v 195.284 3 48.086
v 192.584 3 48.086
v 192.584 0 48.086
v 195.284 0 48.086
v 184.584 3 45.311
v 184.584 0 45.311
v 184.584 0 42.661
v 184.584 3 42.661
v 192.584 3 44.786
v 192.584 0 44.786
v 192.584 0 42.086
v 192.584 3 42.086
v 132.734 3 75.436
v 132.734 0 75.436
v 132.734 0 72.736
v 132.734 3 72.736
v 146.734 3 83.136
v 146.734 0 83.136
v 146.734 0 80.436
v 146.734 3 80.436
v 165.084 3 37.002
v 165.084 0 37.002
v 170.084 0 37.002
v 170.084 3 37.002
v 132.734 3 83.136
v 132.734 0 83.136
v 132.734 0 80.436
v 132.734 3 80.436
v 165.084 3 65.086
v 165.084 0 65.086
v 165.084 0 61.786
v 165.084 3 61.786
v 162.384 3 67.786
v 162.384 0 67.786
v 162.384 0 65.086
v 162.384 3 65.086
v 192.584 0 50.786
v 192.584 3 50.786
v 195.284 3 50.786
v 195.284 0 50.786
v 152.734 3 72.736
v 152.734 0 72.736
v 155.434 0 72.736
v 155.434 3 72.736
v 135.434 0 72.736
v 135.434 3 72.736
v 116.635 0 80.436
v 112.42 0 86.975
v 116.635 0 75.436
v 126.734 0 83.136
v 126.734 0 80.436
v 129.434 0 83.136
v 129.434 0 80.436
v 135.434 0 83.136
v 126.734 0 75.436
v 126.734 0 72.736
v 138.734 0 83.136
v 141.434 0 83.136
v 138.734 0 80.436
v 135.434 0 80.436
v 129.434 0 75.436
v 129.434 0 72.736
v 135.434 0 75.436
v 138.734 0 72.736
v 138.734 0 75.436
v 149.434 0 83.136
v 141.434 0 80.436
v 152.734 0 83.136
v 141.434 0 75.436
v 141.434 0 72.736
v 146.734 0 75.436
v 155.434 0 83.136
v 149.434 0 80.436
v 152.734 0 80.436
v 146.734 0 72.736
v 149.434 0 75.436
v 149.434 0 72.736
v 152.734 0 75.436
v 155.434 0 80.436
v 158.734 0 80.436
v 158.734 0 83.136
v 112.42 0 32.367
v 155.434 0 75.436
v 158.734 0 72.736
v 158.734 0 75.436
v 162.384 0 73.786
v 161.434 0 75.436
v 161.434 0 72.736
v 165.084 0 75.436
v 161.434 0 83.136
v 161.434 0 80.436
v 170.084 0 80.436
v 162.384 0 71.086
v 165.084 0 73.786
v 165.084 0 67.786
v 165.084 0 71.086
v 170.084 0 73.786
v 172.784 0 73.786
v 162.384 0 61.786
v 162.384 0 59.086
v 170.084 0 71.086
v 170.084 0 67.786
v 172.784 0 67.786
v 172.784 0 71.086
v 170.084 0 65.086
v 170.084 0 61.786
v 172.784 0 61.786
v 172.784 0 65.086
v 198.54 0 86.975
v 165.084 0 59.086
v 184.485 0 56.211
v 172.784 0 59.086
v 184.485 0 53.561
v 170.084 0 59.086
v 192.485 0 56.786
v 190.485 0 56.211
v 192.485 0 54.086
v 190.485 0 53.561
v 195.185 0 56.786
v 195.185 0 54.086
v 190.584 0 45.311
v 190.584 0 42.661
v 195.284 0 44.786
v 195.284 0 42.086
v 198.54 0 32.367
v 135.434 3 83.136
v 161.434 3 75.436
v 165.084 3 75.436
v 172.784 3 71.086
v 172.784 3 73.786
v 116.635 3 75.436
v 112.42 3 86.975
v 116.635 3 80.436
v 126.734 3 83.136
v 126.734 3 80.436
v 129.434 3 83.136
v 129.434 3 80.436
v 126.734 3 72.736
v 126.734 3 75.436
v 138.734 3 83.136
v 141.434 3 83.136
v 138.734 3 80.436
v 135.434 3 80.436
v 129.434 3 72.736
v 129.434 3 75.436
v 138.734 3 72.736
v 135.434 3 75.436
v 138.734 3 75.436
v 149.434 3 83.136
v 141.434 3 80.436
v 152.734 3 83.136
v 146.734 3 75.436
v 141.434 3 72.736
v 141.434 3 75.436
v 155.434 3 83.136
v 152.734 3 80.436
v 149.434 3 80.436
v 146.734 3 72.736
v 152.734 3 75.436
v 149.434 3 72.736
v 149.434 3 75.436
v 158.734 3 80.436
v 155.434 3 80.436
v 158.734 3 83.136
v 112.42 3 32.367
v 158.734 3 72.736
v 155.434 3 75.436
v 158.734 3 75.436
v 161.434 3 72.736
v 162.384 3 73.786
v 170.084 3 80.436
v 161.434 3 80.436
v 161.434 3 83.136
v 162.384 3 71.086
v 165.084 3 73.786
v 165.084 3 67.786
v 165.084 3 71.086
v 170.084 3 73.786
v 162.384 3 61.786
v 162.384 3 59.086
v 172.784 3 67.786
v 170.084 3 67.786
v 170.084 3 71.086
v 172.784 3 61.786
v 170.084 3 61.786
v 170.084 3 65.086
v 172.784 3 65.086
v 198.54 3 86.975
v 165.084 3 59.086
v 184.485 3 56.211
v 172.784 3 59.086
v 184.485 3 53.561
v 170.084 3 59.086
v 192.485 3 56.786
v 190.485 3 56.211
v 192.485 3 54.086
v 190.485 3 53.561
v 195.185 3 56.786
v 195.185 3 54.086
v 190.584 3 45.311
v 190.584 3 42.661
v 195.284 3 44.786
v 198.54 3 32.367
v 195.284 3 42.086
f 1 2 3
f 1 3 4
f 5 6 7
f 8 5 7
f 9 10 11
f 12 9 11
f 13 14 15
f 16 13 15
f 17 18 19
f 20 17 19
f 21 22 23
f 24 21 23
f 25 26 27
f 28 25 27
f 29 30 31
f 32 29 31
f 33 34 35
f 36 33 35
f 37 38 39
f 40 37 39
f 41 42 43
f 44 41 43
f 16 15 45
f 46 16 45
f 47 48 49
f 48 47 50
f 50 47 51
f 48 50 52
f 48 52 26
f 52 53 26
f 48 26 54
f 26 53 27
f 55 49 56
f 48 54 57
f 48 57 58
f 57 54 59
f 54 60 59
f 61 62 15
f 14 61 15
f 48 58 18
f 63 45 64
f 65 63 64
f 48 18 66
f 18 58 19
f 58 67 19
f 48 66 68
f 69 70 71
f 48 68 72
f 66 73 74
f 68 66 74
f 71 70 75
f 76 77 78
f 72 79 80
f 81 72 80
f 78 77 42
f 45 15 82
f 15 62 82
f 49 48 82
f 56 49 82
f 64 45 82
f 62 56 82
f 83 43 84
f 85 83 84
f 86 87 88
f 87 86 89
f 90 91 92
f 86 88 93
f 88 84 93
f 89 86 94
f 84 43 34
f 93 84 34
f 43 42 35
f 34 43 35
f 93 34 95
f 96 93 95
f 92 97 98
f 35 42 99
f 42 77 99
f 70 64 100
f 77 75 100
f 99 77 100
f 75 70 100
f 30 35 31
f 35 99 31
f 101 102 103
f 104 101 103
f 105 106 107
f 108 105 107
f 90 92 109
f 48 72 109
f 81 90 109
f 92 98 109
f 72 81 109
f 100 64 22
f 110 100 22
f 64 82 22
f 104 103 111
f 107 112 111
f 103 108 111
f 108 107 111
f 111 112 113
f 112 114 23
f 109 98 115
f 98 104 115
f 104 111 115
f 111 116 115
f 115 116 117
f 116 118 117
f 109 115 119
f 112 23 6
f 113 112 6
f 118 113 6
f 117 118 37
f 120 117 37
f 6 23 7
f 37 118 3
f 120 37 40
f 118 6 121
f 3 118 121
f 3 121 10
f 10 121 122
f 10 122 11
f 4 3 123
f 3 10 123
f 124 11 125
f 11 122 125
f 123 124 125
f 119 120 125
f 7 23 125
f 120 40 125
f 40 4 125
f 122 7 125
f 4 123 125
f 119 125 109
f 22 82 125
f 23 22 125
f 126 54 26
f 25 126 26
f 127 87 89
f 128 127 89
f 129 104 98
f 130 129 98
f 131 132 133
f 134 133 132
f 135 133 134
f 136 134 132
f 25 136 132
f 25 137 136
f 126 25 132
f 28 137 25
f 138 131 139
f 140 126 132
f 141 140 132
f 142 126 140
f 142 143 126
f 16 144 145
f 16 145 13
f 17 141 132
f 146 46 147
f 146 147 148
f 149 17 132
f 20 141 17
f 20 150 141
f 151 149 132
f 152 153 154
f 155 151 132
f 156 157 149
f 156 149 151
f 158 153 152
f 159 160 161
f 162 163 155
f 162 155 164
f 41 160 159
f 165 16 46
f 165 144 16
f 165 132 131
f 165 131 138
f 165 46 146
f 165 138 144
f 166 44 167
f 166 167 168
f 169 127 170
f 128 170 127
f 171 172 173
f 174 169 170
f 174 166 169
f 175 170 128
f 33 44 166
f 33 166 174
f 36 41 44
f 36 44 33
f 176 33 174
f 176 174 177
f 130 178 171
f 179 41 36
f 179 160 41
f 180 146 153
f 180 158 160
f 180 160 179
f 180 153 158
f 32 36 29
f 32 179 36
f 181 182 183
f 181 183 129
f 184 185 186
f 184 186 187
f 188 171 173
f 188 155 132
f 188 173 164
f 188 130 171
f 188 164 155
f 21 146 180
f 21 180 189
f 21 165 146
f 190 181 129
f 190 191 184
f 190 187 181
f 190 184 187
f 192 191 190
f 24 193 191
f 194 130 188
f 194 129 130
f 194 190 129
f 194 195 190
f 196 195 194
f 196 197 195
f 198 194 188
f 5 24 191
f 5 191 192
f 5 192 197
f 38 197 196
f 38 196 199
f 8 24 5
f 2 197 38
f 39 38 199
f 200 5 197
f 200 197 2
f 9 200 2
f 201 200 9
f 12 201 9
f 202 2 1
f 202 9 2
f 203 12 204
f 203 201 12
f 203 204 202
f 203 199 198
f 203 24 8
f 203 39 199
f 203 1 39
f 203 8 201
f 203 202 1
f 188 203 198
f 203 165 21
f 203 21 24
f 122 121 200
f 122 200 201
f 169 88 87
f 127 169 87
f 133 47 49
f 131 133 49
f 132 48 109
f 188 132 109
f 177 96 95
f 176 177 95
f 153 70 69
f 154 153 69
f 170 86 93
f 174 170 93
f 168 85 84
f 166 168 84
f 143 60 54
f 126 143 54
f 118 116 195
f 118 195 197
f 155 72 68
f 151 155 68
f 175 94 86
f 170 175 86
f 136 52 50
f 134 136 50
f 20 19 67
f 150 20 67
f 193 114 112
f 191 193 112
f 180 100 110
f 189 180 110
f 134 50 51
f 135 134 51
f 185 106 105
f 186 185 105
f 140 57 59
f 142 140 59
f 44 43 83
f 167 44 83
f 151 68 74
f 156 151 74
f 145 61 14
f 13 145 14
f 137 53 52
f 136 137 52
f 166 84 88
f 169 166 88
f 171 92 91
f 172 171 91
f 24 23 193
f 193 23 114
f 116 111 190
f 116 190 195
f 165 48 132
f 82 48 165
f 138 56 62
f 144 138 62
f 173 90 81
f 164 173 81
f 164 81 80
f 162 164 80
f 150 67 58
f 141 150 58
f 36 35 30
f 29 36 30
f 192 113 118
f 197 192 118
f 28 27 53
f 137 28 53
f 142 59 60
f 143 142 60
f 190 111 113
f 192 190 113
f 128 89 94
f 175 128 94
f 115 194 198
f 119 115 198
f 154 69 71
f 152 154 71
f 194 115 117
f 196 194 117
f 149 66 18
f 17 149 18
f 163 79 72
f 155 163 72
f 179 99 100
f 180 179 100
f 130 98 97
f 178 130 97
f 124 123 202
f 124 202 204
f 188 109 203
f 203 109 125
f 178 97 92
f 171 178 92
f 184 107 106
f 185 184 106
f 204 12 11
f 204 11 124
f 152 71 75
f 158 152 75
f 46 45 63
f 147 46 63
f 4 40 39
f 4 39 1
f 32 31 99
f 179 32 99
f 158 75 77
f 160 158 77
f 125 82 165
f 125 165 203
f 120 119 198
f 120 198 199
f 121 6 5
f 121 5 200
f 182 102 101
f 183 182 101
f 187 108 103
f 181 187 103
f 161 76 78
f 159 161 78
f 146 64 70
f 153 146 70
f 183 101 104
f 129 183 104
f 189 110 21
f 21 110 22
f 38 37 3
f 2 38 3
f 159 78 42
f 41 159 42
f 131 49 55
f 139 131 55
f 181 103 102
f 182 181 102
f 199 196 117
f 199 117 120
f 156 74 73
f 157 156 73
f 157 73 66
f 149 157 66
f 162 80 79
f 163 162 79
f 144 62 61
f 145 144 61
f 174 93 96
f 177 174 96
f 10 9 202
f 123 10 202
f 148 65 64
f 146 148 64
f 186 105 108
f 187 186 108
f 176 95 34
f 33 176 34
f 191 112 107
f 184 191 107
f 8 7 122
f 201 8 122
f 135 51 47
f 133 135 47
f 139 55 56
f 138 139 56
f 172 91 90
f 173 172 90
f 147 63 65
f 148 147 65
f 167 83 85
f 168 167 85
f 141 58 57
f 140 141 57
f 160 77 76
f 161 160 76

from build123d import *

# Parameters (mm, degrees)
SKETCH1_W           = 86.120484183
SKETCH1_H           = 54.608623026
SKETCH1_W_2         = 2.7
SKETCH1_H_2         = 2.7
SKETCH1_W_3         = 6
SKETCH1_H_3         = 2.65
BOSS_EXTRUDE1_DEPTH = 3


with BuildPart() as part:
    # Sketch1 → Boss-Extrude1 (new body)
    with BuildSketch(Plane(origin=(0, 0, 0), x_dir=(1, 0, 0), z_dir=(0, 1, 0))):
        with Locations((155.479789649, -59.671038124)):
            Rectangle(SKETCH1_W, SKETCH1_H)
        with Locations((193.834702188, -55.435925566)):
            Rectangle(SKETCH1_W_2, SKETCH1_H_2, mode=Mode.SUBTRACT)
        with Locations((193.933836211, -49.435925566)):
            Rectangle(SKETCH1_W_2, SKETCH1_H_2, mode=Mode.SUBTRACT)
        with Locations((193.933836211, -43.435925566)):
            Rectangle(SKETCH1_W_2, SKETCH1_H_2, mode=Mode.SUBTRACT)
        with Locations((187.484702188, -54.885926943)):
            Rectangle(SKETCH1_W_3, SKETCH1_H_3, mode=Mode.SUBTRACT)
        with Locations((187.583836211, -43.985925566)):
            Rectangle(SKETCH1_W_3, SKETCH1_H_3, mode=Mode.SUBTRACT)
        Polygon((129.433836211, -75.435925566), (132.733836211, -75.435925566), (132.733836211, -72.735925566), (135.433836211, -72.735925566), (135.433836211, -75.435925566), (138.733836211, -75.435925566), (138.733836211, -72.735925566), (141.433836211, -72.735925566), (141.433836211, -75.435925566), (146.733836211, -75.435925566), (146.733836211, -72.735925566), (149.433836211, -72.735925566), (149.433836211, -75.435925566), (152.733836211, -75.435925566), (152.733836211, -72.735925566), (155.433836211, -72.735925566), (155.433836211, -75.435925566), (158.733836211, -75.435925566), (158.733836211, -72.735925566), (161.433836211, -72.735925566), (161.433836211, -75.435925566), (165.083836211, -75.435925566), (165.083836211, -73.785925566), (162.383836211, -73.785925566), (162.383836211, -71.085925566), (165.083836211, -71.085925566), (165.083836211, -67.785925566), (162.383836211, -67.785925566), (162.383836211, -65.085925566), (165.083836211, -65.085925566), (165.083836211, -61.785925566), (162.383836211, -61.785925566), (162.383836211, -59.085925566), (165.083836211, -59.085925566), (165.083836211, -37.002032915), (170.083836211, -37.002032915), (170.083836211, -59.085925566), (172.783836211, -59.085925566), (172.783836211, -61.785925566), (170.083836211, -61.785925566), (170.083836211, -65.085925566), (172.783836211, -65.085925566), (172.783836211, -67.785925566), (170.083836211, -67.785925566), (170.083836211, -71.085925566), (172.783836211, -71.085925566), (172.783836211, -73.785925566), (170.083836211, -73.785925566), (170.083836211, -75.435925566), (170.083836211, -80.435925566), (161.433836211, -80.435925566), (161.433836211, -83.135925566), (158.733836211, -83.135925566), (158.733836211, -80.435925566), (155.433836211, -80.435925566), (155.433836211, -83.135925566), (152.733836211, -83.135925566), (152.733836211, -80.435925566), (149.433836211, -80.435925566), (149.433836211, -83.135925566), (146.733836211, -83.135925566), (146.733836211, -80.435925566), (141.433836211, -80.435925566), (141.433836211, -83.135925566), (138.733836211, -83.135925566), (138.733836211, -80.435925566), (135.433836211, -80.435925566), (135.433836211, -83.135925566), (132.733836211, -83.135925566), (132.733836211, -80.435925566), (129.433836211, -80.435925566), (129.433836211, -83.135925566), (126.733836211, -83.135925566), (126.733836211, -80.435925566), (116.63506554, -80.435925566), (116.63506554, -75.435925566), (126.733836211, -75.435925566), (126.733836211, -72.735925566), (129.433836211, -72.735925566), align=None, mode=Mode.SUBTRACT)
    extrude(amount=BOSS_EXTRUDE1_DEPTH)


solid = part.part
